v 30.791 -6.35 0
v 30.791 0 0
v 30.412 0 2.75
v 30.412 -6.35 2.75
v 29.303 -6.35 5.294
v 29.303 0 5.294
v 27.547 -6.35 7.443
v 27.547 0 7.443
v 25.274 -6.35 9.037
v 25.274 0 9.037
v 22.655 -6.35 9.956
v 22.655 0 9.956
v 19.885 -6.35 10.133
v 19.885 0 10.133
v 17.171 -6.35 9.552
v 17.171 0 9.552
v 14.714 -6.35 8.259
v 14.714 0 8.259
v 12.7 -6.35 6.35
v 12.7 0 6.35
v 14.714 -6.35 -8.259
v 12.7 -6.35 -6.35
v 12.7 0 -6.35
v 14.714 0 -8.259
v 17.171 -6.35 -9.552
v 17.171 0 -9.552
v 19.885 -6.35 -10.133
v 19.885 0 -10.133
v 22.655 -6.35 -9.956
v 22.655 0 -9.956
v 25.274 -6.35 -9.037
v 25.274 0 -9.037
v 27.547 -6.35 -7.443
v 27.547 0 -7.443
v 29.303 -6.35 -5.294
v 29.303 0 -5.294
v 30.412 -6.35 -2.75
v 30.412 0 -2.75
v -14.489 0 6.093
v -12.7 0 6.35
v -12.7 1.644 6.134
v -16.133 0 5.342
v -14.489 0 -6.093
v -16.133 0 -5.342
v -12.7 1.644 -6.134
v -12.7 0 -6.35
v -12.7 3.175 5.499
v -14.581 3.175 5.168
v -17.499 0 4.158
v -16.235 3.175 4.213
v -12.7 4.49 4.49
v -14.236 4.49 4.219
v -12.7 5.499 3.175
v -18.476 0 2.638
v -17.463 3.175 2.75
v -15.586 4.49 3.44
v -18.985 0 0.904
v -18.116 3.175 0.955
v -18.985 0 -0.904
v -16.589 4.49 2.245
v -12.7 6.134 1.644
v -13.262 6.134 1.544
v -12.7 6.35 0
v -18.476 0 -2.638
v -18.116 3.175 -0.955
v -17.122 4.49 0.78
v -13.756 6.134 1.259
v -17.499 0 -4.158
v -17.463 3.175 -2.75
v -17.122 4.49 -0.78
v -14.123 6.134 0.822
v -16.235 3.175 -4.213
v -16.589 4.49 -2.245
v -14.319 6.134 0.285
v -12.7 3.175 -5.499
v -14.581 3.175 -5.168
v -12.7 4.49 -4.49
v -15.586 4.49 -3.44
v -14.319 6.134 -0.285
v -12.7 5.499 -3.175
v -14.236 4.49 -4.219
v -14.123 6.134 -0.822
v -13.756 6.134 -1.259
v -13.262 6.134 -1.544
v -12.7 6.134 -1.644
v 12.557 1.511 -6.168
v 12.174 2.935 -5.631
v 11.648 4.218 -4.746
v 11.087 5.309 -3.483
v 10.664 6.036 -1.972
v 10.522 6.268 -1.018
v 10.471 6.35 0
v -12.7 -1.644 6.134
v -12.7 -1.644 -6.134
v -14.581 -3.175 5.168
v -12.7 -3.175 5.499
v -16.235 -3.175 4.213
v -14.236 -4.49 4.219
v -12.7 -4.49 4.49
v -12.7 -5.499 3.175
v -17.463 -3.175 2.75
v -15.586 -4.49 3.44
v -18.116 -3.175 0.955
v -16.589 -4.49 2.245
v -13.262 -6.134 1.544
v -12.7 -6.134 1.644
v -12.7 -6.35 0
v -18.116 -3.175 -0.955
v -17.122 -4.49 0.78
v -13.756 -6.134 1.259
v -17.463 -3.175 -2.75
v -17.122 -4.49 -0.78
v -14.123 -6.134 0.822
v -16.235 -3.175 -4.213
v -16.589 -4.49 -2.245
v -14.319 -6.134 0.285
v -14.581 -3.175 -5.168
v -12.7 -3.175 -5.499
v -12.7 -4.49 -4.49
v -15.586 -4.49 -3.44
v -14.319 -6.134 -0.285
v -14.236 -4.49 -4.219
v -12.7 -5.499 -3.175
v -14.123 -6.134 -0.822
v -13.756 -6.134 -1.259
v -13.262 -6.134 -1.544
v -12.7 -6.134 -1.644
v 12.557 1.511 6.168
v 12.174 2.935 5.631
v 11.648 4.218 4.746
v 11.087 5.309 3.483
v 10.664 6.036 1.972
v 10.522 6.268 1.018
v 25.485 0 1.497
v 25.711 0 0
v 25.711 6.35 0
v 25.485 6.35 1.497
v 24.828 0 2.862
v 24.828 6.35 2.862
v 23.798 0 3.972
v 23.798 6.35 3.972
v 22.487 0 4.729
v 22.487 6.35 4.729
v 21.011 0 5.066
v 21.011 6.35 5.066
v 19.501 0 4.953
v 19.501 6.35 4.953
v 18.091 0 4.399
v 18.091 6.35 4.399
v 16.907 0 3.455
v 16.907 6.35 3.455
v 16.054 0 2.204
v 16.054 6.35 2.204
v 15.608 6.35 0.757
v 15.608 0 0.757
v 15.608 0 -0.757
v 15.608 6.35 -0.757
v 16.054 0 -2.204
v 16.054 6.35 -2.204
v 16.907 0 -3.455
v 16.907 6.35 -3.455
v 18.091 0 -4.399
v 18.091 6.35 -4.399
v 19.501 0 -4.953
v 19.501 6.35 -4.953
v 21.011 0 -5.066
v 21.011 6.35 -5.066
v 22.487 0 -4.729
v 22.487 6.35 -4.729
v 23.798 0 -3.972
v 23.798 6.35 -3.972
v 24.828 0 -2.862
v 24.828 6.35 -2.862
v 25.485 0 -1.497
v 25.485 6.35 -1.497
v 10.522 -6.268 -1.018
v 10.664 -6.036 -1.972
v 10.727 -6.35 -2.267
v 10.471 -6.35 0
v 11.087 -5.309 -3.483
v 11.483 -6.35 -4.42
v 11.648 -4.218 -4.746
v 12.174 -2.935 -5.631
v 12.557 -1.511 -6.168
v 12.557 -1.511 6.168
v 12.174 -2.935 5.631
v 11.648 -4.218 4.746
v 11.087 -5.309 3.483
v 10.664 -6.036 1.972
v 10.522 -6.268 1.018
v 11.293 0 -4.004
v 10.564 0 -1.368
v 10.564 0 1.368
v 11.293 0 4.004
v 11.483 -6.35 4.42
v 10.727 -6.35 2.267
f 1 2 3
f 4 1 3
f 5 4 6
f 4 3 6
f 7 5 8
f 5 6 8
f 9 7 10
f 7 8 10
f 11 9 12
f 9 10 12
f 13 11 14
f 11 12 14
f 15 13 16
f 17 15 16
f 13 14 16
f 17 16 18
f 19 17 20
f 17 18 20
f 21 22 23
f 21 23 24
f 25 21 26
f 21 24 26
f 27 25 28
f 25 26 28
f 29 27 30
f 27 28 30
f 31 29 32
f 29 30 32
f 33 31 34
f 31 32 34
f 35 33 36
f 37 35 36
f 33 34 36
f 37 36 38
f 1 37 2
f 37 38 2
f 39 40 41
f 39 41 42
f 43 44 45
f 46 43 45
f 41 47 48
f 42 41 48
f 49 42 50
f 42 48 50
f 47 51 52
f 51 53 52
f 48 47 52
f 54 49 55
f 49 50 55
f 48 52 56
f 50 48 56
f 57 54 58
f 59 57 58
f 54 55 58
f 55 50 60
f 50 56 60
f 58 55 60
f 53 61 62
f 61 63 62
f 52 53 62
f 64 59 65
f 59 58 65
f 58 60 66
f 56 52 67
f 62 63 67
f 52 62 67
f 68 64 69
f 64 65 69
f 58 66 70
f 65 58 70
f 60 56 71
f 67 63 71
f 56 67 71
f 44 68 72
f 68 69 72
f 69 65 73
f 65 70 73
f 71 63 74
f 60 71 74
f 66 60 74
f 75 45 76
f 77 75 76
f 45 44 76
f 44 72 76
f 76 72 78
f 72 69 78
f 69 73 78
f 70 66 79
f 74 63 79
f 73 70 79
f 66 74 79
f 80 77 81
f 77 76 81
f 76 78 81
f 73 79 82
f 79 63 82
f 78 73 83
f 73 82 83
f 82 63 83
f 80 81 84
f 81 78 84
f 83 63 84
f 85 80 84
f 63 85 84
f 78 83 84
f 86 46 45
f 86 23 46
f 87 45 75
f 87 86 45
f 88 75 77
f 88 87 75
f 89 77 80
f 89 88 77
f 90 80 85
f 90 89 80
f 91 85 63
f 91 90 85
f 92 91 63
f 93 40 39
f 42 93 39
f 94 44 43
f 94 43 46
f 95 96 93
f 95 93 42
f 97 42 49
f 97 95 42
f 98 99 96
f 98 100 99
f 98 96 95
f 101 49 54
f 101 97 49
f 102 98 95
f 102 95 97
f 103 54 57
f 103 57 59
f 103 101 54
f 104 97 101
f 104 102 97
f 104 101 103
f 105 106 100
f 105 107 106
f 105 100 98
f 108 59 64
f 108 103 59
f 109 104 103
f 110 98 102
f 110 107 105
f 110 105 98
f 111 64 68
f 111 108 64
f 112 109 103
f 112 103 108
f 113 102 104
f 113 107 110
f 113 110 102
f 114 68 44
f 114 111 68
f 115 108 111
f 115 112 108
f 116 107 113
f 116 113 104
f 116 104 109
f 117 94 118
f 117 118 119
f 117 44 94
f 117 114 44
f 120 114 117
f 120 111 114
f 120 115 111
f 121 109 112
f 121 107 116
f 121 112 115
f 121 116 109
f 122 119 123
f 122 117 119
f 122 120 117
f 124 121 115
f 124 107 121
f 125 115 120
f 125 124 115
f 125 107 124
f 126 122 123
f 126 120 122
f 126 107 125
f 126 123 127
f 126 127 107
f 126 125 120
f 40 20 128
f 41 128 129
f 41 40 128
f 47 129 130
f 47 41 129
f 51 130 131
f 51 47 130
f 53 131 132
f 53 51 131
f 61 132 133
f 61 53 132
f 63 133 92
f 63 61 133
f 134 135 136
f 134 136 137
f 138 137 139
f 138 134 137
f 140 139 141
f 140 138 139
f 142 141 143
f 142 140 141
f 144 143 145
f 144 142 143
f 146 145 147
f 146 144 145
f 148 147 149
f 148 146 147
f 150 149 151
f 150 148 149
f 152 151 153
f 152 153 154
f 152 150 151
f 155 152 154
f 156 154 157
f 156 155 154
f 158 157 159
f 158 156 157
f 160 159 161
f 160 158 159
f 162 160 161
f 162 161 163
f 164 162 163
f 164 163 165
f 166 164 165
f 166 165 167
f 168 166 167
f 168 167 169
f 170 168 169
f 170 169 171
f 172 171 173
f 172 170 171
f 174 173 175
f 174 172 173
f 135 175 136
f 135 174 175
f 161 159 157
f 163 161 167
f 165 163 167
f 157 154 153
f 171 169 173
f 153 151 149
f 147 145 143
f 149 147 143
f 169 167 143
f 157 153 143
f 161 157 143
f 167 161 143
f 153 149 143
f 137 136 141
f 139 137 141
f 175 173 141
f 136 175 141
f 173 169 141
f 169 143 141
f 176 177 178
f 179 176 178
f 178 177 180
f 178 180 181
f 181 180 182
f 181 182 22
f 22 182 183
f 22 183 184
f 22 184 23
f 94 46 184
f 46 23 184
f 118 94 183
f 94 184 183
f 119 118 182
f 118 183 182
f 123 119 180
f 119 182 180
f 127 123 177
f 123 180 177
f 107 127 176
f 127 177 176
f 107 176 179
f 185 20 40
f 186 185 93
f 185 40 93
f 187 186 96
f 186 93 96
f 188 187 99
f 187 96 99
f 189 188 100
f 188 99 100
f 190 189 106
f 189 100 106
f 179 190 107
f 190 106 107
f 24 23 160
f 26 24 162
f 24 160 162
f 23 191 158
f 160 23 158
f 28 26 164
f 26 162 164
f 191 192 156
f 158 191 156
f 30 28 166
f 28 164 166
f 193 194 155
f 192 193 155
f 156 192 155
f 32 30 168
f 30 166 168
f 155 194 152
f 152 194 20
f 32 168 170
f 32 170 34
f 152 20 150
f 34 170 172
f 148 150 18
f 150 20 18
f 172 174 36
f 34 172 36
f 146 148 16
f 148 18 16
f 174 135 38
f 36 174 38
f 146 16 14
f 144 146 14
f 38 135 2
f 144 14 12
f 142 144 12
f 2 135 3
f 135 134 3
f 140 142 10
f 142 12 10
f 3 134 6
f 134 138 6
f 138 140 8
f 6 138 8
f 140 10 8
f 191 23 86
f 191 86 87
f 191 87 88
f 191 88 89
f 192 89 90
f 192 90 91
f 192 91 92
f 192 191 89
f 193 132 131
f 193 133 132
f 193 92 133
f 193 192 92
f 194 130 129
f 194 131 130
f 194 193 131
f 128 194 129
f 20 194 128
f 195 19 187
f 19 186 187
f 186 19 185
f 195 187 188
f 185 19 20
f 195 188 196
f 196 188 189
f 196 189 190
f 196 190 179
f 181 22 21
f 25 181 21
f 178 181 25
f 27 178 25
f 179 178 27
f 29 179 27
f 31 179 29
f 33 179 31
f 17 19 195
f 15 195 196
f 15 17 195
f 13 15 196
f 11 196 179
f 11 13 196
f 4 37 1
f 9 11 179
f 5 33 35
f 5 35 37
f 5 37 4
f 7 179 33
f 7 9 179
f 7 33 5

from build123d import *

# Parameters (mm, degrees)
F1_DEPTH = 6.35
F2_R     = 6.3499
F0_R     = 5.08
F3_DEPTH = 6.35
F4_DEPTH = 6.35


# Not quite as in the source:
# - a fillet or chamfer is up to 0.001 mm smaller than in the source, because OpenCascade refuses the exact size


with BuildPart() as f1:
    # F0 (on Front) → F1 (new body, symmetric)
    with BuildSketch(Plane.XZ):
        with BuildLine():
            Line((12.7, 6.35), (-12.7, 6.35))
            Line((-12.7, 6.35), (-12.7, -6.35))
            Line((-12.7, -6.35), (12.7, -6.35))
            ThreePointArc((12.7, -6.35), (10.471147458, 0), (12.7, 6.35))
        make_face()
        with BuildLine():
            Line((-12.7, -6.35), (-12.7, 6.35))
            ThreePointArc((-12.7, 6.35), (-19.05, 0), (-12.7, -6.35))
        make_face()
    extrude(amount=F1_DEPTH, both=True)

    # F2 (radius 6.35 in the source; OpenCascade refuses exactly that, so slightly less here)
    f2_edges = [f1.edges().sort_by_distance(p)[0] for p in [
        (0, -6.35, 6.35),
        (0, 6.35, 6.35),
        (0, -6.35, -6.35),
        (0, 6.35, -6.35),
    ]]
    fillet(f2_edges, radius=F2_R)

    # F0 (on Front) → F3 (join)
    with BuildSketch(Plane.XZ):
        with BuildLine():
            ThreePointArc((30.791147458, 0), (23.9960502669, 9.5866067556), (12.7, 6.35))
            Line((12.7, 6.35), (12.7, -6.35))
            ThreePointArc((12.7, -6.35), (23.9960502669, -9.5866067556), (30.791147458, 0))
        make_face()
        with Locations((20.631147458, 0)):
            Circle(F0_R, mode=Mode.SUBTRACT)
        with BuildLine():
            Line((12.7, -6.35), (12.7, 6.35))
            ThreePointArc((12.7, 6.35), (10.471147458, 0), (12.7, -6.35))
        make_face()
    extrude(amount=F3_DEPTH)

    # F0 (on Front) → F4 (join, symmetric)
    with BuildSketch(Plane.XZ):
        with Locations((20.631147458, 0)):
            Circle(F0_R)
    extrude(amount=F4_DEPTH, both=True)


solid = f1.part
